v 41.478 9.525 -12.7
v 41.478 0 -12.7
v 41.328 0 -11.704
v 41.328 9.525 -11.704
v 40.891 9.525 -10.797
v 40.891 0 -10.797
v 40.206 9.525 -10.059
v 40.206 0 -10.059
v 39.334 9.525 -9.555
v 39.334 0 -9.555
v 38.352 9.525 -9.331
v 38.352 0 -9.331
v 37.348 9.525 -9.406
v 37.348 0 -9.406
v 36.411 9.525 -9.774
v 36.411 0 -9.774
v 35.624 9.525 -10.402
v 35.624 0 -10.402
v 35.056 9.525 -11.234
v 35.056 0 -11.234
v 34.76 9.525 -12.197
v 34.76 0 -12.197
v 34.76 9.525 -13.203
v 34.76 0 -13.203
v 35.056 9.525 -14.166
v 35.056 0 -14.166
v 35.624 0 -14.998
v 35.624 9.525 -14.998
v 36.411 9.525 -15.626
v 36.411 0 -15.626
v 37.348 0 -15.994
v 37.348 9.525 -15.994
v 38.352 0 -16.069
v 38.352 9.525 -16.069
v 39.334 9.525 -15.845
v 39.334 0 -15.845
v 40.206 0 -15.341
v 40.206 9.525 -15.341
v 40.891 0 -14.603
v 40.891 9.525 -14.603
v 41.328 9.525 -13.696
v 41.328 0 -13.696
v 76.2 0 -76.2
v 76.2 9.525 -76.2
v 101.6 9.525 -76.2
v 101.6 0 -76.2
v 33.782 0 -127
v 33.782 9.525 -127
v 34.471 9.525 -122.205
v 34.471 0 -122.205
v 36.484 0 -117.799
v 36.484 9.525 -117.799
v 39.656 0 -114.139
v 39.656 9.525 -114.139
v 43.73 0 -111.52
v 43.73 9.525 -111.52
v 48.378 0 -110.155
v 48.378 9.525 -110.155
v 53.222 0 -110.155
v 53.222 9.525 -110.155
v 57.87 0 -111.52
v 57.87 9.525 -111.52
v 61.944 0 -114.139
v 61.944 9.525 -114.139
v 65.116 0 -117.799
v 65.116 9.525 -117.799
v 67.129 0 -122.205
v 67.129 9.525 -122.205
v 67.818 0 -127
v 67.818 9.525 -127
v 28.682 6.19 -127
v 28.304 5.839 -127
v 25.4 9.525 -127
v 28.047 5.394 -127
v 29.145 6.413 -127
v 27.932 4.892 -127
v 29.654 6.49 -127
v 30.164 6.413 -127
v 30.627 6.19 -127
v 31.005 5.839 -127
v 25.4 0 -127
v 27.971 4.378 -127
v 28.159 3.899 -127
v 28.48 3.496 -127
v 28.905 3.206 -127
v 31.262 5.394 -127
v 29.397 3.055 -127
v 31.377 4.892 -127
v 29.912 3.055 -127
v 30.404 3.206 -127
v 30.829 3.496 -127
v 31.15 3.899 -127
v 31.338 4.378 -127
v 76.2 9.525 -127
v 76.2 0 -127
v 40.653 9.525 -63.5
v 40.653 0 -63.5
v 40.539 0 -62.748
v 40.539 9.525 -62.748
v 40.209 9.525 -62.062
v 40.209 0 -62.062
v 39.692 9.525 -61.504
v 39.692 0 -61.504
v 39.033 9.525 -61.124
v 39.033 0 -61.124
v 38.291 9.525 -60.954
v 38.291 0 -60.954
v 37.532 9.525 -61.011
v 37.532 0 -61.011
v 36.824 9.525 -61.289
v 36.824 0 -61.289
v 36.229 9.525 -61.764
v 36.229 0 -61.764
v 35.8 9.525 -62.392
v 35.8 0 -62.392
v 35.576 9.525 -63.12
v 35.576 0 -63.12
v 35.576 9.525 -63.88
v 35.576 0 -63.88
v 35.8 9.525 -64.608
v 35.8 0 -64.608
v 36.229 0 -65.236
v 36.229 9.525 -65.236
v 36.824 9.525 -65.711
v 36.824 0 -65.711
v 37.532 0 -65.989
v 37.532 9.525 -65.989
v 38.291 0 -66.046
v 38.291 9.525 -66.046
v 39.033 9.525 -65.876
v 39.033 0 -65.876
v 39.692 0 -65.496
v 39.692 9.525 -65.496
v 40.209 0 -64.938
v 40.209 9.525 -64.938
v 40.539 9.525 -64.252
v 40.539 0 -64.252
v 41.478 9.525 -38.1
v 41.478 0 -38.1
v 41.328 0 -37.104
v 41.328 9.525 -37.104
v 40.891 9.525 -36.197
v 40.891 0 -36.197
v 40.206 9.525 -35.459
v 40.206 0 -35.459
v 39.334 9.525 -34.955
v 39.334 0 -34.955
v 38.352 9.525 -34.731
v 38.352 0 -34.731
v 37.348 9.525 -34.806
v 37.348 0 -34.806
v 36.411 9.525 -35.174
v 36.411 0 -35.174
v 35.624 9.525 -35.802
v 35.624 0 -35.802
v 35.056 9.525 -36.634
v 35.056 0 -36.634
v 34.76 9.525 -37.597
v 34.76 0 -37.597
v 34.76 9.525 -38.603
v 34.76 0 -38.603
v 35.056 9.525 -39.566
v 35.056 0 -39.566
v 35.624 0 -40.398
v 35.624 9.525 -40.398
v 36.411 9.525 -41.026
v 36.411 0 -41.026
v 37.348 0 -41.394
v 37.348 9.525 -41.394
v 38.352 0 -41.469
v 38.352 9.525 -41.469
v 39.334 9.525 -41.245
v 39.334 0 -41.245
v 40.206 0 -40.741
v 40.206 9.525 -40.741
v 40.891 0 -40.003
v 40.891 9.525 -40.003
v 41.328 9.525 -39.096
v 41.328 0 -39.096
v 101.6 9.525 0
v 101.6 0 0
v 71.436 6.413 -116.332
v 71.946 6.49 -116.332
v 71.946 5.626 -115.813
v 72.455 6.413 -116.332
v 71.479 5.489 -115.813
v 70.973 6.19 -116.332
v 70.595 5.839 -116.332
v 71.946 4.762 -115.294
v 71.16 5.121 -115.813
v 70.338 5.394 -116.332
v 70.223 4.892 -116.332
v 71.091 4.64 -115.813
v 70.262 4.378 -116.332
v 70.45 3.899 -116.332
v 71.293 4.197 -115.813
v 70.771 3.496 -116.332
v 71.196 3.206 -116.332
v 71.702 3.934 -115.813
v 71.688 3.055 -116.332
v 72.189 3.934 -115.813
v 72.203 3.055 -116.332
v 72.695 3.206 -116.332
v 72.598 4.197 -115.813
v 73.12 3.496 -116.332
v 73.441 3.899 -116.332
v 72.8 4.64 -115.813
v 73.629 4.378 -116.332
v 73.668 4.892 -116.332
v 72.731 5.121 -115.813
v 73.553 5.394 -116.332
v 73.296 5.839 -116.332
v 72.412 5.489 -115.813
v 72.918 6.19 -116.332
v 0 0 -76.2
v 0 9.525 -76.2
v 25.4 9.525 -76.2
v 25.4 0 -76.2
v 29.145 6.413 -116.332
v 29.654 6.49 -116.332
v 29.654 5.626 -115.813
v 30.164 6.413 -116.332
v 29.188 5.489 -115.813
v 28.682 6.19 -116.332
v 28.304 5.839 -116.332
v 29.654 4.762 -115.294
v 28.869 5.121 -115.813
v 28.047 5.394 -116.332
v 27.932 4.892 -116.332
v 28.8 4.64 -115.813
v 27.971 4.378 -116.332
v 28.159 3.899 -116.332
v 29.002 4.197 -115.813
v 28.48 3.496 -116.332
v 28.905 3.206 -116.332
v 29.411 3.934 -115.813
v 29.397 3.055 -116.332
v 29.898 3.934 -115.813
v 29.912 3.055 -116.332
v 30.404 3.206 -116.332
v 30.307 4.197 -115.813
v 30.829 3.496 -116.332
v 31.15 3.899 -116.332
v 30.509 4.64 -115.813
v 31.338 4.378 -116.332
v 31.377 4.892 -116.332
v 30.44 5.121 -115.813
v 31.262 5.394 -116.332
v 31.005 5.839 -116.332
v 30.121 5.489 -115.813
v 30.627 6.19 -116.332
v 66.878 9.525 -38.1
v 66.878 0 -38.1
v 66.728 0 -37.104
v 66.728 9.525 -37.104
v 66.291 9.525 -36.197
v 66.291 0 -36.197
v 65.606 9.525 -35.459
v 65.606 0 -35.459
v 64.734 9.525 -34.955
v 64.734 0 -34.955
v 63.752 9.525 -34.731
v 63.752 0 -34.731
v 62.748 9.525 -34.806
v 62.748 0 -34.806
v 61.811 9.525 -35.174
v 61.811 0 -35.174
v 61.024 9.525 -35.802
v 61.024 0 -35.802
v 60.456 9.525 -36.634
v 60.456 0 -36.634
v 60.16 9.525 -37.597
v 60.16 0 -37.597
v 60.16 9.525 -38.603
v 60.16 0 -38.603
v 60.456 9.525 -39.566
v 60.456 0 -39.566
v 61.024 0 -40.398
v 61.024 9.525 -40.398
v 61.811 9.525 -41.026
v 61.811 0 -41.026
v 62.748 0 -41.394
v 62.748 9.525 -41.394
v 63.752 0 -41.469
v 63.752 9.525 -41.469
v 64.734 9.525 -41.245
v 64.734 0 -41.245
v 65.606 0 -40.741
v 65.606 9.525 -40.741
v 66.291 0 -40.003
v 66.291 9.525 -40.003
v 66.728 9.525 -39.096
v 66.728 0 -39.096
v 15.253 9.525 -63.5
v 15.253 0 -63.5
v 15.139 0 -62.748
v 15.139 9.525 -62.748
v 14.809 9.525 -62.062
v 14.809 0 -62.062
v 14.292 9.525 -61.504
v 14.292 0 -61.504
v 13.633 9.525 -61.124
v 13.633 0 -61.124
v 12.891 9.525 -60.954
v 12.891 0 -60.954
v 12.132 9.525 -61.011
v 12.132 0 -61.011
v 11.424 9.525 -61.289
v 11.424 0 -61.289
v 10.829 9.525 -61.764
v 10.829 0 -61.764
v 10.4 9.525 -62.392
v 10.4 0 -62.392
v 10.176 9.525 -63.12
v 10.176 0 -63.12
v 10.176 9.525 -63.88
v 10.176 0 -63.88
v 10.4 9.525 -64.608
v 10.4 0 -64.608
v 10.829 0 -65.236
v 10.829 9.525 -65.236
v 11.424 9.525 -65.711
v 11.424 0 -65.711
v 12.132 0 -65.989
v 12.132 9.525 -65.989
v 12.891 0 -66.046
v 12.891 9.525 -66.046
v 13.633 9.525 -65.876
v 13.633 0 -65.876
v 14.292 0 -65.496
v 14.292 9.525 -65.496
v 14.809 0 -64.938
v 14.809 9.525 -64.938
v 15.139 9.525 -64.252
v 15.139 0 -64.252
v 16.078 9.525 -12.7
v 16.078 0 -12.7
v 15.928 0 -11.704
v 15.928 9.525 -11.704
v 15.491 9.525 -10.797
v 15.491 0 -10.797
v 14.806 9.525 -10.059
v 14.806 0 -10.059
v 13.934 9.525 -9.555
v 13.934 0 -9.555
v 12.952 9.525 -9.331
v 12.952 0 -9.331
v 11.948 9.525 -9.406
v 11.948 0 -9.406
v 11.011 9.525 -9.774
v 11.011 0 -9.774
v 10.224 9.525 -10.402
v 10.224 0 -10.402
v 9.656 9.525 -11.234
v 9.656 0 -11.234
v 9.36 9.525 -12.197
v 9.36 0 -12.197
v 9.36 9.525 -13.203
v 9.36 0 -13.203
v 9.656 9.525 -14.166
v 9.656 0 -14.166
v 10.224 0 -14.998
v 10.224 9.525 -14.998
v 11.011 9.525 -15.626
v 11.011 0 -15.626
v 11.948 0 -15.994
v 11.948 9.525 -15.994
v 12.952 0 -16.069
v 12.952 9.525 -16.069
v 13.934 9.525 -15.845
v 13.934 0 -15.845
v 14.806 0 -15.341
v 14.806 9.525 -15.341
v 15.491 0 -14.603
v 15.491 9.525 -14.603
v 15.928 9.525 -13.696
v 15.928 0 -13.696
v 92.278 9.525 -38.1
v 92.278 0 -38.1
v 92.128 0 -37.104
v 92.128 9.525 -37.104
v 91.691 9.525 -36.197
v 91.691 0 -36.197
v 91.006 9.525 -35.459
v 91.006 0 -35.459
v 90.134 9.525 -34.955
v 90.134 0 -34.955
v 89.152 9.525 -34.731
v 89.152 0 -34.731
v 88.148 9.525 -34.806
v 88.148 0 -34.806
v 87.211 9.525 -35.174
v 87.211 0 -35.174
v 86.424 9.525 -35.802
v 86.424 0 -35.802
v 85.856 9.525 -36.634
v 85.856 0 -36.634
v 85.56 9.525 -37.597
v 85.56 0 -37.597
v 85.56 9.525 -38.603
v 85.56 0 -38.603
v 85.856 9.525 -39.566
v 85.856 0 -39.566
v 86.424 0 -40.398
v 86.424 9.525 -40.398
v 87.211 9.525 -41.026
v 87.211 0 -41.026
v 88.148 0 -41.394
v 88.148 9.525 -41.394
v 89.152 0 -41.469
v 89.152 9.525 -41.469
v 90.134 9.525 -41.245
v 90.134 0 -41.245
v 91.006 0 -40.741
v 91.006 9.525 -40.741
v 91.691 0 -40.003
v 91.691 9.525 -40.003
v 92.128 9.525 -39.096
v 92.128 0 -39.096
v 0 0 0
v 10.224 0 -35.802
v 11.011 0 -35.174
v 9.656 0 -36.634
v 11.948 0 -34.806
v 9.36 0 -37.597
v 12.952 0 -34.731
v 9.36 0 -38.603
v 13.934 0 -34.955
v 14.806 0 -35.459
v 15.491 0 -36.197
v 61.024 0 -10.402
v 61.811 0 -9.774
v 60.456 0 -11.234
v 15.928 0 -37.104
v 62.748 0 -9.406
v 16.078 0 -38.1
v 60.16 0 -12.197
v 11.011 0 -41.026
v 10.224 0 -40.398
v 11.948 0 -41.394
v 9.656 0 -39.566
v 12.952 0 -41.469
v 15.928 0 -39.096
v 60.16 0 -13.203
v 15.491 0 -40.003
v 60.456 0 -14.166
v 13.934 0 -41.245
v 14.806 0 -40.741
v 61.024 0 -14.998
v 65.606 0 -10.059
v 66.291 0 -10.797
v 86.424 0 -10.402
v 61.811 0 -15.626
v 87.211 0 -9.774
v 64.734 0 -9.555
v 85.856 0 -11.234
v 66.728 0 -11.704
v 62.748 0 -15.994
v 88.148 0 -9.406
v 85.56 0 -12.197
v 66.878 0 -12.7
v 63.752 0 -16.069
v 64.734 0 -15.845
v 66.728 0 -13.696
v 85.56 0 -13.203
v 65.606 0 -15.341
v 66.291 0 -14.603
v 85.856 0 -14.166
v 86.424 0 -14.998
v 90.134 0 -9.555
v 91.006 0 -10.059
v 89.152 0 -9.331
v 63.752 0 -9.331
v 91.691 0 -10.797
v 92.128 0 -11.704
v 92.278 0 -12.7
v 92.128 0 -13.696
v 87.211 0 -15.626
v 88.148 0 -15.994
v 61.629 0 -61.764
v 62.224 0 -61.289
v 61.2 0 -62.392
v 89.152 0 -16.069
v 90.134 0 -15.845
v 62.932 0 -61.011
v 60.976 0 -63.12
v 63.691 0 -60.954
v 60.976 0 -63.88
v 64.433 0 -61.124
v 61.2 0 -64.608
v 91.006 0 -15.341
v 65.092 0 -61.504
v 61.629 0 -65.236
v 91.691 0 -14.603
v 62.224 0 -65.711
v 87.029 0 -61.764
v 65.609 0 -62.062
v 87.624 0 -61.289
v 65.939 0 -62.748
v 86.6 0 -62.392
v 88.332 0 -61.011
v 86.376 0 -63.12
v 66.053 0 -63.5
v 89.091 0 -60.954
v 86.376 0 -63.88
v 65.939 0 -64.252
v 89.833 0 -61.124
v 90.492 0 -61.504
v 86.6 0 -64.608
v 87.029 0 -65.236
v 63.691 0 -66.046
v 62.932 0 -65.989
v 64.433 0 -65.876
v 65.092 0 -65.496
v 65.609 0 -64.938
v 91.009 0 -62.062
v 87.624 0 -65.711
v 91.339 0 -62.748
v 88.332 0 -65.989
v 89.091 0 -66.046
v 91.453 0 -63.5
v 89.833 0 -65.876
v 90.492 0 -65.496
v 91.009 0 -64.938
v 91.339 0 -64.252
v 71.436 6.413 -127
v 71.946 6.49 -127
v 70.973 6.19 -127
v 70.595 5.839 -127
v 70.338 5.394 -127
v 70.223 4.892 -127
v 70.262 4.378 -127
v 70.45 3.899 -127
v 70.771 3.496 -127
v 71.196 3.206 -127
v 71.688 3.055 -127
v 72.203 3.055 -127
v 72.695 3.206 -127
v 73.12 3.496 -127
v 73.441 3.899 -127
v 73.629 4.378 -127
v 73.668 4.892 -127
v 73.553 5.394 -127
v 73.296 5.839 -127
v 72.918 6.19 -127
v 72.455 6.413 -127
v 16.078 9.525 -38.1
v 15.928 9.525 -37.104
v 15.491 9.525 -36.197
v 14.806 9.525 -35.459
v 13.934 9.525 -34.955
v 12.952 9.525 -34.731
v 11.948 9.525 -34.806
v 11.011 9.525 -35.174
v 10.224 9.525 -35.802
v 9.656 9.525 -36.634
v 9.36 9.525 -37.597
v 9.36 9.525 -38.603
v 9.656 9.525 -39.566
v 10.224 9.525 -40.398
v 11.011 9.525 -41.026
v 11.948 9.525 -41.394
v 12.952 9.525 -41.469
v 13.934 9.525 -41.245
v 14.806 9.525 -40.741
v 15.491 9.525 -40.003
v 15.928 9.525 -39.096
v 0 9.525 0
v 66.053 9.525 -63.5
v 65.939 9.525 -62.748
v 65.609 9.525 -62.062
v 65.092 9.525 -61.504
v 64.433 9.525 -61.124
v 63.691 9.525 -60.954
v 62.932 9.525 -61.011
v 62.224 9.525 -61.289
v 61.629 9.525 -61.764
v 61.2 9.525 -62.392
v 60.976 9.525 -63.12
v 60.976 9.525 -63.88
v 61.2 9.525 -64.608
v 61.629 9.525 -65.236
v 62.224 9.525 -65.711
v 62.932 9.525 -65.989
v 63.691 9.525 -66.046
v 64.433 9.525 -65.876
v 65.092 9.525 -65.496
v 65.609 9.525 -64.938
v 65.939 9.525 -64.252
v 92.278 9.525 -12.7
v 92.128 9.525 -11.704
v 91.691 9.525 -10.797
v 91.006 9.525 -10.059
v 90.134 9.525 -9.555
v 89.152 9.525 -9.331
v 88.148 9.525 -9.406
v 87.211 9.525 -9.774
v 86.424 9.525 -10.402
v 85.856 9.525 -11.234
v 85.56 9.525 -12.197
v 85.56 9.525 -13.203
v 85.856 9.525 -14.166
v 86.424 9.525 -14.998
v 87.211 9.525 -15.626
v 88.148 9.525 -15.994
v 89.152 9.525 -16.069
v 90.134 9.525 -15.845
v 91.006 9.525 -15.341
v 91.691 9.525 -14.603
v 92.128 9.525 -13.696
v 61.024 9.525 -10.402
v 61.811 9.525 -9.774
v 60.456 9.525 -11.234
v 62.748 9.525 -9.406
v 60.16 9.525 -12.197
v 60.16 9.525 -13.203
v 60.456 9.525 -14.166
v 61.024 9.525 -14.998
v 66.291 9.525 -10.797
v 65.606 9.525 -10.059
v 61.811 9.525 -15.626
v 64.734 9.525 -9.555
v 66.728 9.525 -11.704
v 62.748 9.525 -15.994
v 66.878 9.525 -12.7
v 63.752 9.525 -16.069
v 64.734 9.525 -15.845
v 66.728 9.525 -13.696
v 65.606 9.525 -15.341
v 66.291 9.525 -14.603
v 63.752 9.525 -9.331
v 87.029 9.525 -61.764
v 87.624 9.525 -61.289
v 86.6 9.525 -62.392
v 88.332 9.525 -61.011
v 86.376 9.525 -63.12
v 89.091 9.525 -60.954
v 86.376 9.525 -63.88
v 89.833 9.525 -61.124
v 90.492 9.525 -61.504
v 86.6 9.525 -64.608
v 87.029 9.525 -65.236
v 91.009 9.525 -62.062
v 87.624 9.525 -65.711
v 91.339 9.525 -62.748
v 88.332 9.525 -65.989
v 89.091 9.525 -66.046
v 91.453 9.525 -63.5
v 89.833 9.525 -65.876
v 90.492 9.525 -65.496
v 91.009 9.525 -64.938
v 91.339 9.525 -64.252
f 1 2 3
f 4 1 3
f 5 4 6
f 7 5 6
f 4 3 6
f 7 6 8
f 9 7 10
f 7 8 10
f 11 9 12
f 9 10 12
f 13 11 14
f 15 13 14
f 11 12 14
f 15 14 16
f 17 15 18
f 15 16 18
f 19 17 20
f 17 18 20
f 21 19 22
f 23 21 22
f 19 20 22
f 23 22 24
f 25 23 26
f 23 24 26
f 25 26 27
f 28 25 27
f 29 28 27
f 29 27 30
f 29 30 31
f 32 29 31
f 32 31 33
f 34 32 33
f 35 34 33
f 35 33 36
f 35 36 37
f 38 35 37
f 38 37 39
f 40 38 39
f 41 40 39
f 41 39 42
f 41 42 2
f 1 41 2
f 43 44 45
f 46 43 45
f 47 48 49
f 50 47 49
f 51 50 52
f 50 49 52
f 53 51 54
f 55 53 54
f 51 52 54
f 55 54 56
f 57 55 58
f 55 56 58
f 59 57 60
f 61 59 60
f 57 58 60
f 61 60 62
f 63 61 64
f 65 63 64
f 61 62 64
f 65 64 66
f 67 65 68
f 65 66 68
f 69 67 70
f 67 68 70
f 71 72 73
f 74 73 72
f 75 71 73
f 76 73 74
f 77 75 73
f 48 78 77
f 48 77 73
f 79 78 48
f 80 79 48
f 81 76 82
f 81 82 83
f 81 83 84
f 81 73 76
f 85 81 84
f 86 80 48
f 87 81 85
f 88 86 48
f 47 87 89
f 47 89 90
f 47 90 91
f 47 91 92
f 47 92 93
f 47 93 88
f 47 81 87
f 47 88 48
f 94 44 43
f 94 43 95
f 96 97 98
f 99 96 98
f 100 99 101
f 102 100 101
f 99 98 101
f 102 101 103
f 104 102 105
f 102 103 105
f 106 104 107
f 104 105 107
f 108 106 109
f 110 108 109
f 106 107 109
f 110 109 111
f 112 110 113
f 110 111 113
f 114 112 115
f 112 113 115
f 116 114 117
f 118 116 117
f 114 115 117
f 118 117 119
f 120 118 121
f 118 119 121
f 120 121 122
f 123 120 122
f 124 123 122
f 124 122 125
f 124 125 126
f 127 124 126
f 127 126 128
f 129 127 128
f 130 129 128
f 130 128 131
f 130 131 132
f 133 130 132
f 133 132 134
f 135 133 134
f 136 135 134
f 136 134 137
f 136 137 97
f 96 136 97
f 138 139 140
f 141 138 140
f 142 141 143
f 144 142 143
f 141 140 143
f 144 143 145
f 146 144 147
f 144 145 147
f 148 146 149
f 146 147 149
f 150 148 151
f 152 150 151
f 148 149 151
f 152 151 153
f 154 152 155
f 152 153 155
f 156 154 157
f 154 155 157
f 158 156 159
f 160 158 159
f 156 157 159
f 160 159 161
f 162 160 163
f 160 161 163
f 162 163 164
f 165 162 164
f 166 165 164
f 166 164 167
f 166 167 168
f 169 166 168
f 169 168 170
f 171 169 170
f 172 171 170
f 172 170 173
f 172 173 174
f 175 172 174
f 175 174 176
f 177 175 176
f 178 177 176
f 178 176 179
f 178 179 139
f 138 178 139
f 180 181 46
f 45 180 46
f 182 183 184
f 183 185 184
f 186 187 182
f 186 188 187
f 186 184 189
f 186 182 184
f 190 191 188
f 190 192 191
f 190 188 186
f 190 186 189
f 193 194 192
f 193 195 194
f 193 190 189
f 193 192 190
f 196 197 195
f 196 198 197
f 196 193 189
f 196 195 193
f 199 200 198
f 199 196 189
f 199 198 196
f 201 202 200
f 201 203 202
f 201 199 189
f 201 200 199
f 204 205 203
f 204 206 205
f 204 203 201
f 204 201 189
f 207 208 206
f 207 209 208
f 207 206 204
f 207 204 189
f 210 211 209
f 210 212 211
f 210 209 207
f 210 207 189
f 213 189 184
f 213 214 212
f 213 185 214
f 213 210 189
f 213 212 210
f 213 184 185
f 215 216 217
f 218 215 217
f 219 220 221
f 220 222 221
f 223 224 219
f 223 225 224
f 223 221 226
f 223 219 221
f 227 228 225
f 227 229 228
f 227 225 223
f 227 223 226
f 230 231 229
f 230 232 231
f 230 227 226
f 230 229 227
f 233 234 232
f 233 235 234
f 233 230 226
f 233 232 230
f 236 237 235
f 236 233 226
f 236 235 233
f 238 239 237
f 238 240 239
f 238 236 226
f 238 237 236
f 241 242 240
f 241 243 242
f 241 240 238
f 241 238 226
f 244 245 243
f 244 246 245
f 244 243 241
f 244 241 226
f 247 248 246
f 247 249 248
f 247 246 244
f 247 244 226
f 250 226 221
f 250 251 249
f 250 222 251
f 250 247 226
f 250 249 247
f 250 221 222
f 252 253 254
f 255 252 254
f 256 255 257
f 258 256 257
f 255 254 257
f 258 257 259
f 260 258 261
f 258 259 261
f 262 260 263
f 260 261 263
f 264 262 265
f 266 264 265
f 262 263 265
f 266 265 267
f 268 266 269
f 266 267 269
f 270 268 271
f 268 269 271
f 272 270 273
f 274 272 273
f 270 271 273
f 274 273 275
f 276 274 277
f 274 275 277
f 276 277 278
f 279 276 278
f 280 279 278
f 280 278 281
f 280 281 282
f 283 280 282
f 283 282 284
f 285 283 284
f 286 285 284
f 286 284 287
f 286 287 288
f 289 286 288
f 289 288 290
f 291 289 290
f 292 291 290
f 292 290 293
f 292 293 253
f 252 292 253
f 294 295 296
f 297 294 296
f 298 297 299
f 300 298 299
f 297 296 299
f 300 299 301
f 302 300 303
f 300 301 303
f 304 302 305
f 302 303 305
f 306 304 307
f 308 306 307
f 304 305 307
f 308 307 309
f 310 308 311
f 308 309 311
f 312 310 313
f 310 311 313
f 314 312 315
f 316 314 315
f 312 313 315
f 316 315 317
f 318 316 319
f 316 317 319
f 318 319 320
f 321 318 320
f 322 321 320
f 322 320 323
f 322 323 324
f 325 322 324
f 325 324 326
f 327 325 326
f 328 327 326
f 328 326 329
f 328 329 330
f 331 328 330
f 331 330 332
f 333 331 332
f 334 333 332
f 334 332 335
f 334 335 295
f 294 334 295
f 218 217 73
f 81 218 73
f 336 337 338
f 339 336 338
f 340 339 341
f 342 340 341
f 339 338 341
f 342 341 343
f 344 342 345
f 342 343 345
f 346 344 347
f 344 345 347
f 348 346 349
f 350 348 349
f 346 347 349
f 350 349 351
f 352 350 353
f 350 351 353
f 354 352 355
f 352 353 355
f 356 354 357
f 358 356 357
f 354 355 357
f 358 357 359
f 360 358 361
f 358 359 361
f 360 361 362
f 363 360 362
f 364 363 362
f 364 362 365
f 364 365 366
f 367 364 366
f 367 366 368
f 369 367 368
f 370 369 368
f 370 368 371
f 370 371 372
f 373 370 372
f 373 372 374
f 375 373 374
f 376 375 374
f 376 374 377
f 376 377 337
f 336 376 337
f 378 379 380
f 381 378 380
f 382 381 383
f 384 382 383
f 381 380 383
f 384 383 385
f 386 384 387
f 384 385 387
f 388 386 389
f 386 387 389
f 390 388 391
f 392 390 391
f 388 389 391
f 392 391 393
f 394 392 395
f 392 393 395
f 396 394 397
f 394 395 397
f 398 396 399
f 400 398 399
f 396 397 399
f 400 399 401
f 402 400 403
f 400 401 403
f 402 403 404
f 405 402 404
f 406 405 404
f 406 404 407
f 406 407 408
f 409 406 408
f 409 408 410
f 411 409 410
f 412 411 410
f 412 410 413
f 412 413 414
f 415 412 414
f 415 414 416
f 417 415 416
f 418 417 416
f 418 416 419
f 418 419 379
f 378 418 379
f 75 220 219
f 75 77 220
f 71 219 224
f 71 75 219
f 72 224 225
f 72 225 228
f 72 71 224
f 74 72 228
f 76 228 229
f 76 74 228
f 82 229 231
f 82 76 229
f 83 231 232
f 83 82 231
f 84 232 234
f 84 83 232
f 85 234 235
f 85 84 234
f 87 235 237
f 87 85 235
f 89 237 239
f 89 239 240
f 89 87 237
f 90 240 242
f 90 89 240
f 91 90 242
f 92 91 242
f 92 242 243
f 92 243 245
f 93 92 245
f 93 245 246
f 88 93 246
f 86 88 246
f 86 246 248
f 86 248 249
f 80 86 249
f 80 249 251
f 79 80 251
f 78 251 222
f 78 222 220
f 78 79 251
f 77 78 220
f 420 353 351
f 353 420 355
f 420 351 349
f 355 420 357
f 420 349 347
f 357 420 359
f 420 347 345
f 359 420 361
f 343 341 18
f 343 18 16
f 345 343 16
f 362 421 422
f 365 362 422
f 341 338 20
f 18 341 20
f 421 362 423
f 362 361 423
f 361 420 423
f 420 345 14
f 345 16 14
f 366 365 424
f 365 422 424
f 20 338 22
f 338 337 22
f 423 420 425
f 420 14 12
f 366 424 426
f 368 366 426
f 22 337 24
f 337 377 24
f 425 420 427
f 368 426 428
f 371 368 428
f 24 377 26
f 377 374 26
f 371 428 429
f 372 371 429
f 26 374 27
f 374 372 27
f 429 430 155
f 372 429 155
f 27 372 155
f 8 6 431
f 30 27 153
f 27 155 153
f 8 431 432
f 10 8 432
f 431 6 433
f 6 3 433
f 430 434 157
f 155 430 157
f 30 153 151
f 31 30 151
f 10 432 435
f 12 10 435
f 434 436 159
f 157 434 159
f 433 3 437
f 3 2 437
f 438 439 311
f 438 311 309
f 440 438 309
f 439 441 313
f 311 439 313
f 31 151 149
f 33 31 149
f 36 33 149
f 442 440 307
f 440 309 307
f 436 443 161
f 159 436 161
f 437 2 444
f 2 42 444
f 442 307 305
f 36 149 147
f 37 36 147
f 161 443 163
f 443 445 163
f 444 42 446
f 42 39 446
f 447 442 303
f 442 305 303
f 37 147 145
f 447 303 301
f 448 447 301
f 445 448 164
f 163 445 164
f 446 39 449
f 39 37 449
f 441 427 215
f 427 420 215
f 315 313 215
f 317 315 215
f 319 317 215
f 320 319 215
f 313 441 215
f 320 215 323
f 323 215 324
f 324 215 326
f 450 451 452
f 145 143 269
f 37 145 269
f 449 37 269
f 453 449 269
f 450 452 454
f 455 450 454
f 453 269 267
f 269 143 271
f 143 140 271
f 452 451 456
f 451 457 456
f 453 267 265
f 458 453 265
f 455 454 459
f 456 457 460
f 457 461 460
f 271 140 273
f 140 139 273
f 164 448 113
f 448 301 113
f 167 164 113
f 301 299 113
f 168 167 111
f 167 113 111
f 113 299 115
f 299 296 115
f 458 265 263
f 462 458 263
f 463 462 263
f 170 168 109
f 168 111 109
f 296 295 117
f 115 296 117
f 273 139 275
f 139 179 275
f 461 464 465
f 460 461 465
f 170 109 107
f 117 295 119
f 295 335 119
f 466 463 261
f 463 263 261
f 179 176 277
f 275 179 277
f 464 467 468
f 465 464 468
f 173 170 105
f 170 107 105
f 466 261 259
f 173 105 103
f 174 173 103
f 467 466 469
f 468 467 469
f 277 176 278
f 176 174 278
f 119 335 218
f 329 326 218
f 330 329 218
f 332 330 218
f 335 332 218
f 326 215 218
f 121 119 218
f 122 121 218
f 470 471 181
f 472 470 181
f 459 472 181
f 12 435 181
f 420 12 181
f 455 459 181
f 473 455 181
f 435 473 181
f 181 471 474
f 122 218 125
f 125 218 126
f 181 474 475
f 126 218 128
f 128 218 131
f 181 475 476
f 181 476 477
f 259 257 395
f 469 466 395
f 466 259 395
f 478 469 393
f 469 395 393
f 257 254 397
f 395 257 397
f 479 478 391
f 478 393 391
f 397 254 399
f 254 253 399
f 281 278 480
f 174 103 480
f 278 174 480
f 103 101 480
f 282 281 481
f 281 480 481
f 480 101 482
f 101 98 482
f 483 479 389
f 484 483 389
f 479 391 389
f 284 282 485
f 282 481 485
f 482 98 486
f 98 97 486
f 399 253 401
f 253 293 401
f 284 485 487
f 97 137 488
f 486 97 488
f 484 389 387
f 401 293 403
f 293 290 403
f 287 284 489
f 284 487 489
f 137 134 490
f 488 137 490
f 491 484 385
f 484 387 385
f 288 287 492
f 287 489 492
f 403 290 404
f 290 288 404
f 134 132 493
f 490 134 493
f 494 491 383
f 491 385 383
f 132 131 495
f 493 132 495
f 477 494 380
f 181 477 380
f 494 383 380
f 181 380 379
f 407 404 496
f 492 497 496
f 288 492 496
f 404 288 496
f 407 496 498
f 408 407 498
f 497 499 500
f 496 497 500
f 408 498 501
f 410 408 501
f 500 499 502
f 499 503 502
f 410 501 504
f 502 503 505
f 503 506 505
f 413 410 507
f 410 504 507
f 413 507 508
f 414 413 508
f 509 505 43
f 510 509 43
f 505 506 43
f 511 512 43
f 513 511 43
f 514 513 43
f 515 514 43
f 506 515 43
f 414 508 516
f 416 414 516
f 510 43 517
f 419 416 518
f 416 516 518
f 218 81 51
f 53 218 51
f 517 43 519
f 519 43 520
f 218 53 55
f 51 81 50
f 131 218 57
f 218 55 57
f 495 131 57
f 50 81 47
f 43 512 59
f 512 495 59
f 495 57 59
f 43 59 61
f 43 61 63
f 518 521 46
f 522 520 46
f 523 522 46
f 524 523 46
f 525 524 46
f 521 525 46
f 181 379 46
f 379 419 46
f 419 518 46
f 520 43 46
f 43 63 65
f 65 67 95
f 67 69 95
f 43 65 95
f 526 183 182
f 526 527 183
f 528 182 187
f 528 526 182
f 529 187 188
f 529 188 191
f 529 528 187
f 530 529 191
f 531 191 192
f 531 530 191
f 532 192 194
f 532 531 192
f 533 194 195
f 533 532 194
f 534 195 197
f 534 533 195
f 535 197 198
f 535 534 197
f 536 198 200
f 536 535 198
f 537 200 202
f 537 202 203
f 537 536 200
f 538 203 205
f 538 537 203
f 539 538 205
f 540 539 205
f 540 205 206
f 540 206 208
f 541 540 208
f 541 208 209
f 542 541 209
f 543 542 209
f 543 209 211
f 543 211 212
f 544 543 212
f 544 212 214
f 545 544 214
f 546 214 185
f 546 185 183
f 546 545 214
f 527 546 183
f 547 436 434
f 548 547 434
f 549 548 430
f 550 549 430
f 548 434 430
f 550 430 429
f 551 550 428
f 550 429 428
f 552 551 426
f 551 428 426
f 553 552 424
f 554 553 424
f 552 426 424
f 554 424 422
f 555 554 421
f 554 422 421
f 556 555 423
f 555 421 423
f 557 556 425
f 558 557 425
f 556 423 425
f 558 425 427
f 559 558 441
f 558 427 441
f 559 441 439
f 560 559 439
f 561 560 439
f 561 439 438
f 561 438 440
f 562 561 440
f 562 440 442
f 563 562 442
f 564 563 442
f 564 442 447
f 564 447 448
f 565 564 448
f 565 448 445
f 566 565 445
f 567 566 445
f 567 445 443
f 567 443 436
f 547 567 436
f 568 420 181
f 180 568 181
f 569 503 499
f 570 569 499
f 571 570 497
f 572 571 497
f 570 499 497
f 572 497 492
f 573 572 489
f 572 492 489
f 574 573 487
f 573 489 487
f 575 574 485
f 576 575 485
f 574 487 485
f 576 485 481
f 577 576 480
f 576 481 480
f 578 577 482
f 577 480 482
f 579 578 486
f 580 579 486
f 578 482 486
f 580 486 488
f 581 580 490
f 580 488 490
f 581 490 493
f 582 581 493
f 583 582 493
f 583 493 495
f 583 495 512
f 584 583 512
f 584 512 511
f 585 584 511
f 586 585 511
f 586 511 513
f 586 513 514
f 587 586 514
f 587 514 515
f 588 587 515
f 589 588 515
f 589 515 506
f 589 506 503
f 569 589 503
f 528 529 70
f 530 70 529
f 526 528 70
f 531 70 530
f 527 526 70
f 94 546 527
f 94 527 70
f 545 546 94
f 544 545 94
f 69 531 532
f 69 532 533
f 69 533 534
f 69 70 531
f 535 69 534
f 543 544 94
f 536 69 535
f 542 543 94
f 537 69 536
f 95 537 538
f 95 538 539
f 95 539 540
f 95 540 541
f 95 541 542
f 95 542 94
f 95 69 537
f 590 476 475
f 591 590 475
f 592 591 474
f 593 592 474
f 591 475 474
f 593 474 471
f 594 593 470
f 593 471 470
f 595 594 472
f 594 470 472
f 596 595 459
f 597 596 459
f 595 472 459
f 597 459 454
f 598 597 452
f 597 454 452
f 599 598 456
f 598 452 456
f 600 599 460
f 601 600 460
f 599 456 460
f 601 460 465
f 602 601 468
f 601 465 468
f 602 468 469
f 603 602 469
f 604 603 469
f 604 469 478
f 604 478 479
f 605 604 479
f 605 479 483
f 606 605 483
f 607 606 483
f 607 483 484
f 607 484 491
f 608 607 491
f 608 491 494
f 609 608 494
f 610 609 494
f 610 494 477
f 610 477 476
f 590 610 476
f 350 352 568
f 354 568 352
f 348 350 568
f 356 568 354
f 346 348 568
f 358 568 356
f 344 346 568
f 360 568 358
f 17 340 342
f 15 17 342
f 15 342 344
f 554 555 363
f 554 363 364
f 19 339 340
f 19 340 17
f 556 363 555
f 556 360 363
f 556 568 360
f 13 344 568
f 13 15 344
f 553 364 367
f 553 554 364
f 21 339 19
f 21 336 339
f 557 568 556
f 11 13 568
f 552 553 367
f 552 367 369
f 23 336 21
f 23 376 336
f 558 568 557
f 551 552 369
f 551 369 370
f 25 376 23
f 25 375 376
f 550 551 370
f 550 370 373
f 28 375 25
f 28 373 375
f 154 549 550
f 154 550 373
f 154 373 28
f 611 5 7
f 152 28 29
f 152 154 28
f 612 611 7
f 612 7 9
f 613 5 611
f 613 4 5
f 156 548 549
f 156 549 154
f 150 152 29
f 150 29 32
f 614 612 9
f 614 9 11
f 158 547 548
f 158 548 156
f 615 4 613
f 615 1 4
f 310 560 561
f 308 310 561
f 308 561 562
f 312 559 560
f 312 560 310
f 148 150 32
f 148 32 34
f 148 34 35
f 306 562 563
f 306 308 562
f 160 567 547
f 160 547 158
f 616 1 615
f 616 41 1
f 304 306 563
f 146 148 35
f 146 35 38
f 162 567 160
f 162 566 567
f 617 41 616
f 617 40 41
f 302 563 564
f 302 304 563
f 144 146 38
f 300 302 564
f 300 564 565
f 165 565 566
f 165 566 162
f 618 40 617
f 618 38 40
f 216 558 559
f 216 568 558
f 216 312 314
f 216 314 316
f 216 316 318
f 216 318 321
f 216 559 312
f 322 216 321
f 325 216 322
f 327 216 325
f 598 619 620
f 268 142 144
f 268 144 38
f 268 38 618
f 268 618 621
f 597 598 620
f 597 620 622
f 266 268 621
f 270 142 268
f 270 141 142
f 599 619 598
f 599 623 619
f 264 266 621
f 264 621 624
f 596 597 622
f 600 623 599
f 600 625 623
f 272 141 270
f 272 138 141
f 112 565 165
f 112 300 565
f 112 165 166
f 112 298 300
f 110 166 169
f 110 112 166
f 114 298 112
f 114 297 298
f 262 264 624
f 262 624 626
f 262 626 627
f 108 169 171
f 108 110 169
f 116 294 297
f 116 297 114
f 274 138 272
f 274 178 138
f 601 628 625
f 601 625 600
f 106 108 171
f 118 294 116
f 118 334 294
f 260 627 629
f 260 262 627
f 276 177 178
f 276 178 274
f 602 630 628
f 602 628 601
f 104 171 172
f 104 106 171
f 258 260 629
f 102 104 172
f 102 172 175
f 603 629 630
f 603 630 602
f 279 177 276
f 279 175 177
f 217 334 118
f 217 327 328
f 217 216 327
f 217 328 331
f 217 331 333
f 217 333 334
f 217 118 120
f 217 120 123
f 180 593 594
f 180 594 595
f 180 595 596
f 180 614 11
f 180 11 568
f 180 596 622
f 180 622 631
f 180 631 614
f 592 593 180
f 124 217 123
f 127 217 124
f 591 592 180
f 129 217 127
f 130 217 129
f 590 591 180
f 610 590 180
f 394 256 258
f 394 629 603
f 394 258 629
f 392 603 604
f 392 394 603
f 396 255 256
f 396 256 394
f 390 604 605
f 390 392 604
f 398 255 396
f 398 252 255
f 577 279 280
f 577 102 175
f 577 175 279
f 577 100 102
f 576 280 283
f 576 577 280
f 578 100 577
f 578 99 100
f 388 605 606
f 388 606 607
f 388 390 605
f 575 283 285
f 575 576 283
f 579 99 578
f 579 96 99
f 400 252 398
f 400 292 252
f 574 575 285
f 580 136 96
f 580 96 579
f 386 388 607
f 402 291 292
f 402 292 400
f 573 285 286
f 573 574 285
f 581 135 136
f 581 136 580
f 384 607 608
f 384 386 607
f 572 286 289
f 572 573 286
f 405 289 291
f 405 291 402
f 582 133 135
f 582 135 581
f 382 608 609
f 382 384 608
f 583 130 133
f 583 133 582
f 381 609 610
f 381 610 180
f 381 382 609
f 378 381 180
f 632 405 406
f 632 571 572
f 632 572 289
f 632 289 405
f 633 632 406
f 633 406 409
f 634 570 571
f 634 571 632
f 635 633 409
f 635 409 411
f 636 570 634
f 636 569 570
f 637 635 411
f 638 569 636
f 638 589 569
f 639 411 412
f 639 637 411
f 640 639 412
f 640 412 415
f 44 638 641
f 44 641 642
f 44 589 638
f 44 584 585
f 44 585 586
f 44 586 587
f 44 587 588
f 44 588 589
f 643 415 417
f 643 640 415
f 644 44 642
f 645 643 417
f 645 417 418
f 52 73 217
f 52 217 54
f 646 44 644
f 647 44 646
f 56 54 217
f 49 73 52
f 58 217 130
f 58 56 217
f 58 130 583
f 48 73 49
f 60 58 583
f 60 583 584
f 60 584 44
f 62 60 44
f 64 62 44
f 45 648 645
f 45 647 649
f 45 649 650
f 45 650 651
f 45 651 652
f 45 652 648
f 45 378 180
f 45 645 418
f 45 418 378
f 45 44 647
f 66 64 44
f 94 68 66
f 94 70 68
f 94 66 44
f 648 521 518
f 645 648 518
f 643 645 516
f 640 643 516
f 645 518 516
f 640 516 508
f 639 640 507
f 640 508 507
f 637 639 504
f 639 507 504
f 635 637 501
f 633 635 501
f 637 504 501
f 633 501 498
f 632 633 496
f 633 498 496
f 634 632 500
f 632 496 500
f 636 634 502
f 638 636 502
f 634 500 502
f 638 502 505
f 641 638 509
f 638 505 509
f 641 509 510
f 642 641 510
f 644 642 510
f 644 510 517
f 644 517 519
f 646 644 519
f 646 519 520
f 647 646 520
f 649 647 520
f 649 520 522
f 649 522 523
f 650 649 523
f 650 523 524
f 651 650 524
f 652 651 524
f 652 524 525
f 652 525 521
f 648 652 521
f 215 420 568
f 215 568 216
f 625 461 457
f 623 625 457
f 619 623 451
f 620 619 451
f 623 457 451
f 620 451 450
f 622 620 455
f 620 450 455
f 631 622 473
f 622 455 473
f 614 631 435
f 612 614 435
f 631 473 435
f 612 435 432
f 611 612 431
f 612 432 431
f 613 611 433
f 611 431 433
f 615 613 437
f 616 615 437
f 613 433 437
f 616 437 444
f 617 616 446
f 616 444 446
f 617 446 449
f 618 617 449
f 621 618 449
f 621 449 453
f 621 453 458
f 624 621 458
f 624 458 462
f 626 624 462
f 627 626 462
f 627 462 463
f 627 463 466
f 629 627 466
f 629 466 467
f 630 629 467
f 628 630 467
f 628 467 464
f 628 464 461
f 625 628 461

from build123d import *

# Parameters (mm, degrees)
SKETCH1_W                   = 101.6
SKETCH1_H                   = 127
BOSS_EXTRUDE1_DEPTH         = 9.525
SKETCH2_R                   = 17.018
CUT_EXTRUDE1_DEPTH          = 10.525
F_1_4_CLEARANCE_HOLE1_D     = 6.7564
LPATTERN1_COUNT             = 2
LPATTERN1_PITCH             = 25.4
LPATTERN1_COUNT_DIR2        = 4
LPATTERN1_PITCH_DIR2        = 25.4
TAP_DRILL_FOR_1_4_20_TAP1_D = 5.1054
LPATTERN2_COUNT             = 4
LPATTERN2_PITCH             = 25.4
SKETCH7_W                   = 25.4
SKETCH7_H                   = 50.8
CUT_EXTRUDE2_DEPTH          = 10.525
LPATTERN3_COUNT             = 2
LPATTERN3_PITCH             = 42.291


with BuildPart() as part:
    # Sketch1 → Boss-Extrude1 (new body)
    with BuildSketch(Plane(origin=(0, 0, 0), x_dir=(1, 0, 0), z_dir=(0, 1, 0))):
        with Locations((50.8, 63.5)):
            Rectangle(SKETCH1_W, SKETCH1_H)
    extrude(amount=BOSS_EXTRUDE1_DEPTH)

    # Sketch2 → Cut-Extrude1 (cut, through all)
    with BuildSketch(Plane(origin=(0, 9.525, 0), x_dir=(1, 0, 0), z_dir=(0, 1, 0))):
        with Locations((50.8, 127)):
            Circle(SKETCH2_R)
    extrude(amount=-CUT_EXTRUDE1_DEPTH, mode=Mode.SUBTRACT)

    # 1/4 Clearance Hole1 (through all)
    with Locations(Plane(origin=(0, 9.525, 0), x_dir=(-1, 0, 0), z_dir=(0, 1, 0))):
        with Locations((-12.7, -12.7)):
            f_1_4_clearance_hole1 = Hole(F_1_4_CLEARANCE_HOLE1_D / 2)

    # LPattern1: 1_4 Clearance Hole1 2 × 4
    with Locations(*[(j * LPATTERN1_PITCH_DIR2, 0, -i * LPATTERN1_PITCH) for i in range(LPATTERN1_COUNT) for j in range(LPATTERN1_COUNT_DIR2) if (i, j) != (0, 0)]):
        add(f_1_4_clearance_hole1, mode=Mode.SUBTRACT)

    # Tap Drill for 1/4-20 Tap1 (through all)
    with Locations(Plane(origin=(0, 9.525, 0), x_dir=(-1, 0, 0), z_dir=(0, 1, 0))):
        with Locations((-12.7, -63.5)):
            tap_drill_for_1_4_20_tap1 = Hole(TAP_DRILL_FOR_1_4_20_TAP1_D / 2)

    # LPattern2: Tap Drill for 1/4-20 Tap1 ×4
    with Locations(*[(i * LPATTERN2_PITCH, 0, 0) for i in range(1, LPATTERN2_COUNT)]):
        add(tap_drill_for_1_4_20_tap1, mode=Mode.SUBTRACT)

    # Sketch7 → Cut-Extrude2 (cut, through all)
    with BuildSketch(Plane(origin=(0, 9.525, 0), x_dir=(1, 0, 0), z_dir=(0, 1, 0))):
        with Locations((12.7, 101.6)):
            Rectangle(SKETCH7_W, SKETCH7_H)
        with Locations((88.9, 101.6)):
            Rectangle(SKETCH7_W, SKETCH7_H)
    extrude(amount=-CUT_EXTRUDE2_DEPTH, mode=Mode.SUBTRACT)

    # Sketch8 → #8-32 Tapped Hole1 (revolve, cut)
    with BuildSketch(Plane(origin=(29.6545, 4.7625, -127), x_dir=(0, 1, 0), z_dir=(1, 0, 0))):
        Polygon((0, 0), (0, 11.705806461), (1.7272, 10.668), (1.7272, 0), align=None)
    f_8_32_tapped_hole1 = revolve(axis=Axis((29.6545, 4.7625, -133.35), (0, 0, 1)), mode=Mode.SUBTRACT)

    # LPattern3: #8-32 Tapped Hole1 ×2
    with Locations(*[(i * LPATTERN3_PITCH, 0, 0) for i in range(1, LPATTERN3_COUNT)]):
        add(f_8_32_tapped_hole1, mode=Mode.SUBTRACT)


solid = part.part
